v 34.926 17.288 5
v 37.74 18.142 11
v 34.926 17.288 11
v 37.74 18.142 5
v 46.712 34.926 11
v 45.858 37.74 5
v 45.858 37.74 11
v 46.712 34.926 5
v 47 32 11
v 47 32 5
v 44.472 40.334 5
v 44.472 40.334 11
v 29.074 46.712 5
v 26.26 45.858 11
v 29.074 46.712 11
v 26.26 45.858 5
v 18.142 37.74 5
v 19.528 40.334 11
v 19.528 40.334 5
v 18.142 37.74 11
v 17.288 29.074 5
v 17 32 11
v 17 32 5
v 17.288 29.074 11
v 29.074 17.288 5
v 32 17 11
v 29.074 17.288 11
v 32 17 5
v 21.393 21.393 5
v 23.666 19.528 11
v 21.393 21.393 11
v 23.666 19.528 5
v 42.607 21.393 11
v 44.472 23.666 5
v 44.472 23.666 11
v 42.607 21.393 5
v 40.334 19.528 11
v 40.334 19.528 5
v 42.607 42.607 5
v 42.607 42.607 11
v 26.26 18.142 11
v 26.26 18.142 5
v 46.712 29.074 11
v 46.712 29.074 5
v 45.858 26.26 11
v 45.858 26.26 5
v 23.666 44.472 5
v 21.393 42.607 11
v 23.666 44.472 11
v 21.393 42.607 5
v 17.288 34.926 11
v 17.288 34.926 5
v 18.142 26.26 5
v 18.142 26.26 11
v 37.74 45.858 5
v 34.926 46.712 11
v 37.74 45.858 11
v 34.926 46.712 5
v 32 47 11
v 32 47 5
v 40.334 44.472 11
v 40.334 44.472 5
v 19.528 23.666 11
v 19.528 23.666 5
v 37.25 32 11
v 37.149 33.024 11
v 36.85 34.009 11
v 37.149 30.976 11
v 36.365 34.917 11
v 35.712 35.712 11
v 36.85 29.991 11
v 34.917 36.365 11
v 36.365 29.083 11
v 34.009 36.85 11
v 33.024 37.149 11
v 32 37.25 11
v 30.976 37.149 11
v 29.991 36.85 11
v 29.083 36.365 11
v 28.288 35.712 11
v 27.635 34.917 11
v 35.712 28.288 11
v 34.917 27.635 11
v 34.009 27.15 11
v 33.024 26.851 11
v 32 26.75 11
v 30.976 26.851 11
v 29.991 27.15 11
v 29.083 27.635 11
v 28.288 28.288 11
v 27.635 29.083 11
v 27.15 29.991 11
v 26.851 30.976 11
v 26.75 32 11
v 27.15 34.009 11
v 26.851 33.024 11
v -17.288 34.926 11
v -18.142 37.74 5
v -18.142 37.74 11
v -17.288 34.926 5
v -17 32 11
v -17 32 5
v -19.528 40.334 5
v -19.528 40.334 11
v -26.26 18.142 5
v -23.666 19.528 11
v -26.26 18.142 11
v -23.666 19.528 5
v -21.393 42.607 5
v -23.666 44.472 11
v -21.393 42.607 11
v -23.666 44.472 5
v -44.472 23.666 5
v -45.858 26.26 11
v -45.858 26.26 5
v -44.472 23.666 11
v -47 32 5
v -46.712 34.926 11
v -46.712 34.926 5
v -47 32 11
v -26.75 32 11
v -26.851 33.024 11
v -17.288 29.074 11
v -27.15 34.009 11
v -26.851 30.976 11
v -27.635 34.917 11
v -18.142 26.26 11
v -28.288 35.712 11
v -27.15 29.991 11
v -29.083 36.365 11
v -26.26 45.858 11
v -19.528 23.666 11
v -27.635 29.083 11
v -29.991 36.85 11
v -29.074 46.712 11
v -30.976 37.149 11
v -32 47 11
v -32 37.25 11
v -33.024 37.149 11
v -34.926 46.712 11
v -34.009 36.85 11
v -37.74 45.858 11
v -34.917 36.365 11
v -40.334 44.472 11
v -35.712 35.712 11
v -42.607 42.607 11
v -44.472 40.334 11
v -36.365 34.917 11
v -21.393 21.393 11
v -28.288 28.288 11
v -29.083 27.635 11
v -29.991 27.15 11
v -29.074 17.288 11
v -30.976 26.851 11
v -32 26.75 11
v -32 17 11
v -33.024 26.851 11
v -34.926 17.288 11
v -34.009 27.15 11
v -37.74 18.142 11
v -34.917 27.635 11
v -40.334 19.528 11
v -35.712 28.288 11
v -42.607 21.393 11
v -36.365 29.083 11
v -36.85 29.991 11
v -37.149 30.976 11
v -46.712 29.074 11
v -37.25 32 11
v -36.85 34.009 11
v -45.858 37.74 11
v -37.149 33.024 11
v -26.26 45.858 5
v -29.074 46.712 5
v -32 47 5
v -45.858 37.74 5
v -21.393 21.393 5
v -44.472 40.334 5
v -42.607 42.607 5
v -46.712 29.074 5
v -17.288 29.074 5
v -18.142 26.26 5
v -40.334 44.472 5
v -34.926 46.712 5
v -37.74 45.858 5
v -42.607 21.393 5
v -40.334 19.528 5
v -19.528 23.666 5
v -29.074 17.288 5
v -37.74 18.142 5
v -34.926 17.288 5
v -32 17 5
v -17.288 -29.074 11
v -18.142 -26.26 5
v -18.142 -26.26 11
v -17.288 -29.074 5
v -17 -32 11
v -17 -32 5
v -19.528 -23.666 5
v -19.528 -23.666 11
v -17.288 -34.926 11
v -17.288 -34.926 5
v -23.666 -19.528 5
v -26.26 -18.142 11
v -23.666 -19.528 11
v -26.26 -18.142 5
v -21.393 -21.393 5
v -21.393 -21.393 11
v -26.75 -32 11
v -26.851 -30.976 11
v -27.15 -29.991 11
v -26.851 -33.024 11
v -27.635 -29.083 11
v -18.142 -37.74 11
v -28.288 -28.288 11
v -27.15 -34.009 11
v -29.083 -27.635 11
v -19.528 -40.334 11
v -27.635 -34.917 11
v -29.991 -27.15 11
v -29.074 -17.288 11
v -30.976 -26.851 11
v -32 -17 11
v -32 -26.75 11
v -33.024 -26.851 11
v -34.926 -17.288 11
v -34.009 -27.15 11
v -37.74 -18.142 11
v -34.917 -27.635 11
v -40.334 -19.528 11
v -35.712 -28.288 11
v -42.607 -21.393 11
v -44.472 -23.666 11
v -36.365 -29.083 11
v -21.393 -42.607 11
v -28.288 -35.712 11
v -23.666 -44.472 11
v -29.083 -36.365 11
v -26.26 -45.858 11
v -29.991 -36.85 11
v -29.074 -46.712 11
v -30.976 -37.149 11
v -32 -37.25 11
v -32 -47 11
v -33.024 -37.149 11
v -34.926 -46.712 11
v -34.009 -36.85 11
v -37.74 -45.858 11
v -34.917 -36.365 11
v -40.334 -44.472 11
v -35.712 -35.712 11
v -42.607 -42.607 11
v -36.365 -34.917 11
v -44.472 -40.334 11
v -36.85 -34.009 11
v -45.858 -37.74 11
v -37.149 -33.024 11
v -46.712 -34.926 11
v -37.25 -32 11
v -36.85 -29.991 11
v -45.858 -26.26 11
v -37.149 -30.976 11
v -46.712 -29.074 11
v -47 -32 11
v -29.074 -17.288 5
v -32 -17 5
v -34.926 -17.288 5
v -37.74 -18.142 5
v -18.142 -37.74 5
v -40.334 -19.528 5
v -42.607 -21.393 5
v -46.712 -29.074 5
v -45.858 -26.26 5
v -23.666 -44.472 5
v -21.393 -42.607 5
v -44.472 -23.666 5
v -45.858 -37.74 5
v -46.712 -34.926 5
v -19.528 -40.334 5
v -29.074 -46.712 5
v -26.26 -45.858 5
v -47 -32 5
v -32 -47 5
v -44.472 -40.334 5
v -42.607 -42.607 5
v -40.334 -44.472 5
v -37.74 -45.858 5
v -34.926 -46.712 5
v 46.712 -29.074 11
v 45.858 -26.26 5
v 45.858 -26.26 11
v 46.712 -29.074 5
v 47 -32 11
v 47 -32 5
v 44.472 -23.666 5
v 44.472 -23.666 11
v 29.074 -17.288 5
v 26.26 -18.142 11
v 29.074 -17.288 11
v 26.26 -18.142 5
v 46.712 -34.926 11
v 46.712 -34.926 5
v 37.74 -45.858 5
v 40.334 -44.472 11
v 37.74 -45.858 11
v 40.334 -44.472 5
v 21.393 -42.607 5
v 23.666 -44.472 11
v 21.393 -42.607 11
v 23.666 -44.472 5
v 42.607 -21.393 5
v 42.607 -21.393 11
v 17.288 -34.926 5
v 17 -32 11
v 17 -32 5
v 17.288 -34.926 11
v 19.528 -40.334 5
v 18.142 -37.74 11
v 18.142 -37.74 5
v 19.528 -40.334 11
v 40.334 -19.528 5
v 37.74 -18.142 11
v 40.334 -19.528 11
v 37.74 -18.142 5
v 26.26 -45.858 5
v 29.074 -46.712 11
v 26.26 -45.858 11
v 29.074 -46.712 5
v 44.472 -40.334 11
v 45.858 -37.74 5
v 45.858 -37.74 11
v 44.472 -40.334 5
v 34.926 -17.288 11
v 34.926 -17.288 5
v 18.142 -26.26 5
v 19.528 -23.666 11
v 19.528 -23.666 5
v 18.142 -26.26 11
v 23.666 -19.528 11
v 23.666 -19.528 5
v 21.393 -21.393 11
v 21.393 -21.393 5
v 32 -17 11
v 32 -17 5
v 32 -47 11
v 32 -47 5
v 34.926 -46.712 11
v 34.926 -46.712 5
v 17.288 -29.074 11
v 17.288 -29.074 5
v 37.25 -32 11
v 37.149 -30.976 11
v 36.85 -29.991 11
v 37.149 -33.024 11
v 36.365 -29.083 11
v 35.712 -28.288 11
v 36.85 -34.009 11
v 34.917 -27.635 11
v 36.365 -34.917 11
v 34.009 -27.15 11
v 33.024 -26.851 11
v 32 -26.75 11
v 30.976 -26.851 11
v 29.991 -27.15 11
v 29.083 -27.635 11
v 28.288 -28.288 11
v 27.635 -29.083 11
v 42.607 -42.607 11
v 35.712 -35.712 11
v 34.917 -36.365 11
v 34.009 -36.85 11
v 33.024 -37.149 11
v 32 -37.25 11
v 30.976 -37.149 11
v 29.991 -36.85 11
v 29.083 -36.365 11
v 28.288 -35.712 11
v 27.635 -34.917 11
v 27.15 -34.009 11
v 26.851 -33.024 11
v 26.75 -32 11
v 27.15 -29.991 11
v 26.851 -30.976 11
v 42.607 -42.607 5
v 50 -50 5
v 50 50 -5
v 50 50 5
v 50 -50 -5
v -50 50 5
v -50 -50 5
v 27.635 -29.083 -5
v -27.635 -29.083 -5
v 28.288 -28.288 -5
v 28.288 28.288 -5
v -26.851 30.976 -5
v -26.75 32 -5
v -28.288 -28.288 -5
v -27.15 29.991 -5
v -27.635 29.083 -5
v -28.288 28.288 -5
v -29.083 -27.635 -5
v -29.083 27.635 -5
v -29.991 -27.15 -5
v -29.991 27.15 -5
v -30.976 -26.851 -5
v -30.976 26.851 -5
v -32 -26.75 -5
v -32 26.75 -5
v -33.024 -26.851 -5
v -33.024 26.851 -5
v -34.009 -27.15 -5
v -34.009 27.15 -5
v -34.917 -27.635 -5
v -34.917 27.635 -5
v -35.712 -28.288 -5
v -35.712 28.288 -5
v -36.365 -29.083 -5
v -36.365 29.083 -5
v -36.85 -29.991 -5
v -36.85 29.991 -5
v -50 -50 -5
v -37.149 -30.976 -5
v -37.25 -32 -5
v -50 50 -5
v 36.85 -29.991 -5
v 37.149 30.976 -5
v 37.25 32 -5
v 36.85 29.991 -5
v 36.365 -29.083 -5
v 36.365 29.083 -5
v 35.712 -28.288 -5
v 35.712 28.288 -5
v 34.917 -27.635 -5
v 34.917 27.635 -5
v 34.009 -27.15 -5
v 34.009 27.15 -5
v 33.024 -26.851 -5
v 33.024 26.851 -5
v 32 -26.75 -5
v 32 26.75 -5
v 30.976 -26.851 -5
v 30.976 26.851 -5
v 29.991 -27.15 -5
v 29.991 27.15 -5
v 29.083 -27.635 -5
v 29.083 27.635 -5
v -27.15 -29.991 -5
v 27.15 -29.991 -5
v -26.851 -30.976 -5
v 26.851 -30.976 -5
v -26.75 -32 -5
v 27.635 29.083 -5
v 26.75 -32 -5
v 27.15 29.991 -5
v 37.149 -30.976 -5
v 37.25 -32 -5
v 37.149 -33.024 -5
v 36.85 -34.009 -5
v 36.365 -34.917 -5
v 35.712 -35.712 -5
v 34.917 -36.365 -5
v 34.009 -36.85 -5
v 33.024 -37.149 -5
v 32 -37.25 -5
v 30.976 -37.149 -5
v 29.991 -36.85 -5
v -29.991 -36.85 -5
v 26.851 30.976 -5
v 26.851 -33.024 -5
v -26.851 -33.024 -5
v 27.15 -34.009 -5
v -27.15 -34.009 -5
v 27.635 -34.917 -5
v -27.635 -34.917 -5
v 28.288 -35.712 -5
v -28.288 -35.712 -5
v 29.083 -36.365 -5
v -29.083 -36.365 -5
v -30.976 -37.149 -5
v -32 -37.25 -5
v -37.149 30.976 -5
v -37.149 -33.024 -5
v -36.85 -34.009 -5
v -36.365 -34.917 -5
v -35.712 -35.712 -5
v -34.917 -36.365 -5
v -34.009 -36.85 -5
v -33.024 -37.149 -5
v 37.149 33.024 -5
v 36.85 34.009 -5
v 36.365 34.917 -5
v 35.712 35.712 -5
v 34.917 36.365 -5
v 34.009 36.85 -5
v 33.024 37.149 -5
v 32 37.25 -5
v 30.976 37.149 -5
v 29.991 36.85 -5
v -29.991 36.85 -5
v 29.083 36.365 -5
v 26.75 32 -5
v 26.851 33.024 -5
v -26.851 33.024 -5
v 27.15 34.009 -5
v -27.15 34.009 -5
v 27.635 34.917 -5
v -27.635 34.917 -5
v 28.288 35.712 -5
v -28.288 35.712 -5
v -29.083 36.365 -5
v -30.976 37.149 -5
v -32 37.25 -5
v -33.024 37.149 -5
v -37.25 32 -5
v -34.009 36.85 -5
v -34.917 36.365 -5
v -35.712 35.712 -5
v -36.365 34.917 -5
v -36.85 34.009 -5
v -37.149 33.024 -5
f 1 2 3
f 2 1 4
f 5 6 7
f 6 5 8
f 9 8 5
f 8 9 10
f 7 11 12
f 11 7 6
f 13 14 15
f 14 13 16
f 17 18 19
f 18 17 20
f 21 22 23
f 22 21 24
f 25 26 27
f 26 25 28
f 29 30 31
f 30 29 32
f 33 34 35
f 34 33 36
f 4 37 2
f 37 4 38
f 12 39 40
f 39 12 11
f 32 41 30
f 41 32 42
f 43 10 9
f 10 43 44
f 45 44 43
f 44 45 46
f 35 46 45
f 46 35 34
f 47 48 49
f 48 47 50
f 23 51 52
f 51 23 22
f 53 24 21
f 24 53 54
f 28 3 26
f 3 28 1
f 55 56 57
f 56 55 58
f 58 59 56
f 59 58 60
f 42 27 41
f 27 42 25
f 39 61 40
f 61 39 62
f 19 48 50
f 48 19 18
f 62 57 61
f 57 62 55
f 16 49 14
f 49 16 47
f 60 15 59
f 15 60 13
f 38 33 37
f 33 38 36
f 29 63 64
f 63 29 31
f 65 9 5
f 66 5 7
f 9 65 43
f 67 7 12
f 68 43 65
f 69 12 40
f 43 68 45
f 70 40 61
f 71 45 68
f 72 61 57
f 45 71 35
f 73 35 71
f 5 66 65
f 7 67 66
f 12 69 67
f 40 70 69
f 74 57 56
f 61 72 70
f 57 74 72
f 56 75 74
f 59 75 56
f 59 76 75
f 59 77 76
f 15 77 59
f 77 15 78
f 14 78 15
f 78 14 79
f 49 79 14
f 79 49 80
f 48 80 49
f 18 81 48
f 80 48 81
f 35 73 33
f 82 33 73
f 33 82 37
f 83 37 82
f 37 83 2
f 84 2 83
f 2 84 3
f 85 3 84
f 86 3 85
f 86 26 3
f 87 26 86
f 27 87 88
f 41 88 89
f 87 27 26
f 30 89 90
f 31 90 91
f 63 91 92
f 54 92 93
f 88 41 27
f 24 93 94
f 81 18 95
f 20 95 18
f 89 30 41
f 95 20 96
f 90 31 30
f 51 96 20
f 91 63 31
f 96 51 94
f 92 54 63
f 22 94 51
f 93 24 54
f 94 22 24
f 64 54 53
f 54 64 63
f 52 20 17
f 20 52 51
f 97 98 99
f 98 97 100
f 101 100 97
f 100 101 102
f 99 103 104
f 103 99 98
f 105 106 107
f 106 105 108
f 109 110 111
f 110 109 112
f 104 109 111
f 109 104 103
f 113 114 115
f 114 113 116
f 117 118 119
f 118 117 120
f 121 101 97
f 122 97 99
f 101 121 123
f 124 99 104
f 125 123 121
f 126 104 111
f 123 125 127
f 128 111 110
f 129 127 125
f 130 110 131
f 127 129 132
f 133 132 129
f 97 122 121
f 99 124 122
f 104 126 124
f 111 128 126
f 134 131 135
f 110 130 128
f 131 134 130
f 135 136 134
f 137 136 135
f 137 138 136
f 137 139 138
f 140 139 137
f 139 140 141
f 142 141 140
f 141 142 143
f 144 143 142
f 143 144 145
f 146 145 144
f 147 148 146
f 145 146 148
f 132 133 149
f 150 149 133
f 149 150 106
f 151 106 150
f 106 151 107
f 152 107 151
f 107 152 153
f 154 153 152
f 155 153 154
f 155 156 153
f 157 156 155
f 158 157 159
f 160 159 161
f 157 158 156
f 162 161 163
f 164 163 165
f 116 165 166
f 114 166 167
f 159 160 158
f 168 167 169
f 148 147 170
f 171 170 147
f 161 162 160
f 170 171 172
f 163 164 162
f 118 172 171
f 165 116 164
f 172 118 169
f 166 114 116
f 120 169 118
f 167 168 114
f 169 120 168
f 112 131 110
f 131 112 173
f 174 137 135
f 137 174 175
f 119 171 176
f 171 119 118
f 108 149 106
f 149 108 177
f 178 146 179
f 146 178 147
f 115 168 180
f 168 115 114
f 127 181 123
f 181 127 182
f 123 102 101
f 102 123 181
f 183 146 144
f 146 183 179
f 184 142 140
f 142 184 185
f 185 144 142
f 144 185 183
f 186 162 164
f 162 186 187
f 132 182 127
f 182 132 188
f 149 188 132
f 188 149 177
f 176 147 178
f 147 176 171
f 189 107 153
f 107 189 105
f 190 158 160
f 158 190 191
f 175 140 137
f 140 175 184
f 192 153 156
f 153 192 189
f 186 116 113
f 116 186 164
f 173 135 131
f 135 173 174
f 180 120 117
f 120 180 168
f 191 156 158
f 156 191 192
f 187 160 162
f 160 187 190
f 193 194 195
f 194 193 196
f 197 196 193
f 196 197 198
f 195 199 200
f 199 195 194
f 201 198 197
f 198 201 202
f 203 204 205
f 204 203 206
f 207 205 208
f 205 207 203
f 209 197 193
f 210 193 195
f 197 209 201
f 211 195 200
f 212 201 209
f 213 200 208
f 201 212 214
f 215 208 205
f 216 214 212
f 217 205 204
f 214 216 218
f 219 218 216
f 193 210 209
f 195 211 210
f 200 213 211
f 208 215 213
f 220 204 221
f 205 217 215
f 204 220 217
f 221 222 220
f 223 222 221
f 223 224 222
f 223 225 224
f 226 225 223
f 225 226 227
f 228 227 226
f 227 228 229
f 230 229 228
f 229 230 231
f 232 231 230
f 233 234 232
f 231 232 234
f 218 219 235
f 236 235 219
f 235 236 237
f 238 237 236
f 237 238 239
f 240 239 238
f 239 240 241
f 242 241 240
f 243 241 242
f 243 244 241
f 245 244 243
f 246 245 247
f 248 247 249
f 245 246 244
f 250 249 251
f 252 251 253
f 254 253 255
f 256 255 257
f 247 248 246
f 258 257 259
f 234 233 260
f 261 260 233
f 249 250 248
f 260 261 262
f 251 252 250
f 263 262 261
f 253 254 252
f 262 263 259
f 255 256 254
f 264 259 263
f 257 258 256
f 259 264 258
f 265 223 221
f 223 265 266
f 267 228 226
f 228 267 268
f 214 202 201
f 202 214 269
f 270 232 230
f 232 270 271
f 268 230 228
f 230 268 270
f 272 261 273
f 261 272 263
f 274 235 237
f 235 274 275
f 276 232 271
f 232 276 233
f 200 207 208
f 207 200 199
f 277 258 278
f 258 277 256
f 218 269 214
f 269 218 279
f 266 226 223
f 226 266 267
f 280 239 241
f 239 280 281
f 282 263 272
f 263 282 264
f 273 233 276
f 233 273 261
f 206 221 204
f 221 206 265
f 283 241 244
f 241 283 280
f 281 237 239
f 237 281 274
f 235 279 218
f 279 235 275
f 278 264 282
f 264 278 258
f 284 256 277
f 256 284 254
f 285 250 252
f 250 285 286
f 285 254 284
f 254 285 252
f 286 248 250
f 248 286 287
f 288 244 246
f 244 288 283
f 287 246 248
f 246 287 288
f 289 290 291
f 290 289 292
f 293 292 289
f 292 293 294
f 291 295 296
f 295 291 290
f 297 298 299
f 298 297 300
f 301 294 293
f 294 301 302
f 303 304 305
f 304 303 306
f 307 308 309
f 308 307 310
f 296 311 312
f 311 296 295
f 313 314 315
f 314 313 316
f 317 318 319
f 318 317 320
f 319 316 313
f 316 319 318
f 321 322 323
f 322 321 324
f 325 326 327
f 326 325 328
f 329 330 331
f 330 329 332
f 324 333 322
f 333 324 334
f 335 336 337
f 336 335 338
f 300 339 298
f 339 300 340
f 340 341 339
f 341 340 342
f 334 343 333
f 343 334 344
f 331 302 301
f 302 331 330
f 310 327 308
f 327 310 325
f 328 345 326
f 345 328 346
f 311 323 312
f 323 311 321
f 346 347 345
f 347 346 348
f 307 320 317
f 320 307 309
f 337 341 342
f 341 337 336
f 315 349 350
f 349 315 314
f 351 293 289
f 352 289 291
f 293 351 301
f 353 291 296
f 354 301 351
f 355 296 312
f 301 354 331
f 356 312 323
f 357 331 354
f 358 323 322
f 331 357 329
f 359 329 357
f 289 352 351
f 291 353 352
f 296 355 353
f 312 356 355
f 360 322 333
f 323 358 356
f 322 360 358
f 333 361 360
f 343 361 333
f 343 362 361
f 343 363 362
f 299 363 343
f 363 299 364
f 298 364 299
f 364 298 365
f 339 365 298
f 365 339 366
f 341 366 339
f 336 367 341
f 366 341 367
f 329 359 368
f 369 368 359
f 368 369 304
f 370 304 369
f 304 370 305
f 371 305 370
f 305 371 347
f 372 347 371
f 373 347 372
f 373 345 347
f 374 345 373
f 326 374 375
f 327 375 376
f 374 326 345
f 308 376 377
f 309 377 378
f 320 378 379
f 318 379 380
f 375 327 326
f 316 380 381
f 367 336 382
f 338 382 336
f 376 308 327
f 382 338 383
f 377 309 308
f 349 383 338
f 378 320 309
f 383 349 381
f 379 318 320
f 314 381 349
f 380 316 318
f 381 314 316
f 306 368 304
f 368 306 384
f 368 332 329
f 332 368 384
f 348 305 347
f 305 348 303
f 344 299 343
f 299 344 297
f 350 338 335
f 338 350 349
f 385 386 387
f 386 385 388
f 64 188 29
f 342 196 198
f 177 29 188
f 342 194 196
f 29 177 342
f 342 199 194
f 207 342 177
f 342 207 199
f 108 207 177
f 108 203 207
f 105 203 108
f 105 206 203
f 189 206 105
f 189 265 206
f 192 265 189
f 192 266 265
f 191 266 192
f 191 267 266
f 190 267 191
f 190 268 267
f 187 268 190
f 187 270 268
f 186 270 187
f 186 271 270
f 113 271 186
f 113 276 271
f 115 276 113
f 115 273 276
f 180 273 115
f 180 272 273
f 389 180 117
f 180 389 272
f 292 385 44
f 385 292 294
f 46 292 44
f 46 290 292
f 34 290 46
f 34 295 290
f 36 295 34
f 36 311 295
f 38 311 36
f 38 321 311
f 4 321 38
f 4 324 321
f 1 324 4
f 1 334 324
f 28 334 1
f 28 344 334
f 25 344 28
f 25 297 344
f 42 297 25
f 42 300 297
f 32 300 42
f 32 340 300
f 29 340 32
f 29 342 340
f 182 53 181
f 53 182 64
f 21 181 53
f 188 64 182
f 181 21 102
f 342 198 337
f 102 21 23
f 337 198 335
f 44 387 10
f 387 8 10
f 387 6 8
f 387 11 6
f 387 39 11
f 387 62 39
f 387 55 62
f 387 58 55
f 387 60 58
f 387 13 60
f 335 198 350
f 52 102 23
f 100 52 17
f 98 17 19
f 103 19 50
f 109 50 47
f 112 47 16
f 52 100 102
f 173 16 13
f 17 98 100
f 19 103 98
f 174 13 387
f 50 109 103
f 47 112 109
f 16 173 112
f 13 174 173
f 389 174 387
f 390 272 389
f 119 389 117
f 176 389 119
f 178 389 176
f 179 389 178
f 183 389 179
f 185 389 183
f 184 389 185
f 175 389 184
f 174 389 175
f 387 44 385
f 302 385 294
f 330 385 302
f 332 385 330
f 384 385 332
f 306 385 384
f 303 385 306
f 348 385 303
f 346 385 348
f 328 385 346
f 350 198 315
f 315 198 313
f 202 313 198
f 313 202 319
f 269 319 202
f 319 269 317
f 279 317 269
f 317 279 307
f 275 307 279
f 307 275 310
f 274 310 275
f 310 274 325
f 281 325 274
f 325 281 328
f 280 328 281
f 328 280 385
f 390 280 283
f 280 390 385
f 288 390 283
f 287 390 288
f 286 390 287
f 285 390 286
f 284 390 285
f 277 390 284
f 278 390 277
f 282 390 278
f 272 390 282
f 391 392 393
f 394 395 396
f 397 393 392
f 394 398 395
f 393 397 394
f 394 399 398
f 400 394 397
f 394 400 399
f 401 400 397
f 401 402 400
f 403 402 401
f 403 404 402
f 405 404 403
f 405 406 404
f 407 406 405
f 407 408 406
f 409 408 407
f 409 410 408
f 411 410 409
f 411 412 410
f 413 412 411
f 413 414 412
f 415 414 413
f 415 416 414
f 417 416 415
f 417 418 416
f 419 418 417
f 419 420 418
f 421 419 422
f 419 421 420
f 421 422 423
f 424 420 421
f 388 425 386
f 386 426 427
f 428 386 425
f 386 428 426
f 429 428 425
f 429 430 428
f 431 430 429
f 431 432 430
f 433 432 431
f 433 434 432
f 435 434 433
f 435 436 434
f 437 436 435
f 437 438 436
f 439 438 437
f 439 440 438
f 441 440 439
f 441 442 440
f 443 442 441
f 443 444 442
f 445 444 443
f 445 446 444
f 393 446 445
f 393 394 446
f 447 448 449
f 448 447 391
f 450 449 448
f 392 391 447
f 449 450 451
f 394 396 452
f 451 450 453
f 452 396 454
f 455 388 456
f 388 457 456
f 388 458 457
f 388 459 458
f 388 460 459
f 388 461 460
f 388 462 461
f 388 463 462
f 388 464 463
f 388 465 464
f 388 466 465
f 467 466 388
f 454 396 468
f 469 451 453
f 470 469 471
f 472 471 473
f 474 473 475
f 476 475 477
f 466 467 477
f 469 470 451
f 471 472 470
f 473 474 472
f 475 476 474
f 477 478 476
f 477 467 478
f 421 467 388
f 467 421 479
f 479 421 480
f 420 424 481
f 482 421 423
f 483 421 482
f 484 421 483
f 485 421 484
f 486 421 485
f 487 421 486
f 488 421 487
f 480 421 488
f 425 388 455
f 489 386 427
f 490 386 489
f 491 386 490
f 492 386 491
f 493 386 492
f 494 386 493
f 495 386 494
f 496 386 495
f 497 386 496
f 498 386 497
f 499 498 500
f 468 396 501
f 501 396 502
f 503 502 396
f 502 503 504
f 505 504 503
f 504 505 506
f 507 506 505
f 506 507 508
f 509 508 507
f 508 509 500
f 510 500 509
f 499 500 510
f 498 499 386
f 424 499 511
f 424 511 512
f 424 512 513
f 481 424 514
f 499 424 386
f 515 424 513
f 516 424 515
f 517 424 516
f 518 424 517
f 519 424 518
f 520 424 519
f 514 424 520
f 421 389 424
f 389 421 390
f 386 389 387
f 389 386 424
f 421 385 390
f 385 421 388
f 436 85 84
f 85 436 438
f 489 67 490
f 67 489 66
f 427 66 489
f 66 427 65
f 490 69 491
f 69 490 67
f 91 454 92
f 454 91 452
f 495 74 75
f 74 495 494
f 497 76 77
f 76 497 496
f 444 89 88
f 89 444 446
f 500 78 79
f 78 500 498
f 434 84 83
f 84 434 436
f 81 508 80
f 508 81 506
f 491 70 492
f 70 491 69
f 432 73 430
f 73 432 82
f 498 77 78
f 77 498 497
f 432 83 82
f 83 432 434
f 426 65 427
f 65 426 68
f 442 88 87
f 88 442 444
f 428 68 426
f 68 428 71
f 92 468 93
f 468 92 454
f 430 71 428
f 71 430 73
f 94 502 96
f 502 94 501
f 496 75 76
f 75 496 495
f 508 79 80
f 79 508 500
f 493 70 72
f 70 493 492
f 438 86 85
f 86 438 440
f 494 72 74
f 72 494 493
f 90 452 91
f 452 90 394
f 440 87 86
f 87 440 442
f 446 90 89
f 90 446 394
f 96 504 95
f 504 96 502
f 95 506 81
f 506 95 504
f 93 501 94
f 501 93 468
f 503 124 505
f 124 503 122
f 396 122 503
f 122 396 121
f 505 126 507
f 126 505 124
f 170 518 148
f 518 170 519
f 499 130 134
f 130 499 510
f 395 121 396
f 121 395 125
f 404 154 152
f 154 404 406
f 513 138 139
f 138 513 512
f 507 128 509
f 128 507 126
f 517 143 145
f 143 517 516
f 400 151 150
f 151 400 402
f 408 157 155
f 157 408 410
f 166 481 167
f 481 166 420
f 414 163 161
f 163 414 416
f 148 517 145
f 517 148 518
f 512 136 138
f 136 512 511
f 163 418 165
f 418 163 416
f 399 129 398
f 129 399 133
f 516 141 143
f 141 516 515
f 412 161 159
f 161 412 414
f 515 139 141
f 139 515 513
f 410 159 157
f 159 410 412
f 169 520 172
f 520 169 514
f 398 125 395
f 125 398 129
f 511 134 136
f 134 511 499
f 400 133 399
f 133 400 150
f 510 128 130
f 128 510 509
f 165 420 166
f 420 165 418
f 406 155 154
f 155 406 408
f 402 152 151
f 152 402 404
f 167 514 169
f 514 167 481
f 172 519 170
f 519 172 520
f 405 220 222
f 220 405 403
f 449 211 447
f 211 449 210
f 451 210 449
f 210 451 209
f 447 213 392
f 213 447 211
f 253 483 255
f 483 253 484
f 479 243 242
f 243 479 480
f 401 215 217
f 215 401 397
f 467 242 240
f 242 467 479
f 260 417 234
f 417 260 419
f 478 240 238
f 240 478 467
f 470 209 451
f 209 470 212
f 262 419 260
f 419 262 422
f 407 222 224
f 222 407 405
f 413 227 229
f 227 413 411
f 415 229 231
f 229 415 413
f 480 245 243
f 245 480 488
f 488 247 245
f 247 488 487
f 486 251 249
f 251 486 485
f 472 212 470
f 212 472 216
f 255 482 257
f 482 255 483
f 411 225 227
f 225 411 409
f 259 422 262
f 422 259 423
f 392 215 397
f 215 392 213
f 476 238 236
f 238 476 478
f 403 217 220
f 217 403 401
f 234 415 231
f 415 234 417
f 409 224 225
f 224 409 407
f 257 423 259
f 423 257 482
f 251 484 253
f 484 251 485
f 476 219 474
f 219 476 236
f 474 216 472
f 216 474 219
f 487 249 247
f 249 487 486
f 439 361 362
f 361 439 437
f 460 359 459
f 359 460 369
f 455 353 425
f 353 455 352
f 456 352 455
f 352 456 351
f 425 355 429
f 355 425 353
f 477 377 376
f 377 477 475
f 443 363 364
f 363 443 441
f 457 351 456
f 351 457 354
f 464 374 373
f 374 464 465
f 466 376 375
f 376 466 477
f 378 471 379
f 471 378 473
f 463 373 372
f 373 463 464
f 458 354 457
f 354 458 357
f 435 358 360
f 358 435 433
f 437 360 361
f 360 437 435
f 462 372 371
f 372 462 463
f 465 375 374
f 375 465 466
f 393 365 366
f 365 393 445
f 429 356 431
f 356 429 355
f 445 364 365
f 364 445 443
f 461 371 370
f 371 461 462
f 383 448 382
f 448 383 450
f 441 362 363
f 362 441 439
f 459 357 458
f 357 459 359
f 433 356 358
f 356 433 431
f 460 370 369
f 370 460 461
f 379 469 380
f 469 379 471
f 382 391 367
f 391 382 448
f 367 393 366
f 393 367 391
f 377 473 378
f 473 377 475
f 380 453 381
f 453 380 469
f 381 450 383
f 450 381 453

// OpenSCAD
$fn = 32;

// ----------------------------------------------------------------------
// Anchor pads 100 x 100 x 16
// four corner bosses with anchor holes
// ----------------------------------------------------------------------

// --- parameters (mm) ---
plate = [100, 100, 10];  // base plate size (x, y, z)
pads = 4;                // boss count, one per corner
edge = 18;               // boss centre offset from the plate edge
boss_d = 30;             // boss diameter
boss_h = 6;              // boss height above the base plate
hole_d = 10.5;           // hole diameter

// --- derived feature positions (mm) ---
height = plate[2] + boss_h;      // = 16   overall height of the part
corner_x = plate[0] / 2 - edge;  // = 32   boss centre X
corner_y = plate[1] / 2 - edge;  // = 32   boss centre Y
feature_centers = [
  [corner_x, corner_y],
  [-corner_x, corner_y],
  [-corner_x, -corner_y],
  [corner_x, -corner_y]
];   // boss centres, anchor holes are drilled there

// base plate, four bosses standing on it, anchor holes all the way through
difference() {
  union() {
    cube(plate, center = true);
    for (centre = feature_centers)
      translate([centre[0], centre[1], plate[2] / 2 - 1])
        cylinder(d = boss_d, h = boss_h + 1);
  }
  for (centre = feature_centers)
    translate([centre[0], centre[1], -height])
      cylinder(d = hole_d, h = 2 * height + 2);  // through boss and plate
}
